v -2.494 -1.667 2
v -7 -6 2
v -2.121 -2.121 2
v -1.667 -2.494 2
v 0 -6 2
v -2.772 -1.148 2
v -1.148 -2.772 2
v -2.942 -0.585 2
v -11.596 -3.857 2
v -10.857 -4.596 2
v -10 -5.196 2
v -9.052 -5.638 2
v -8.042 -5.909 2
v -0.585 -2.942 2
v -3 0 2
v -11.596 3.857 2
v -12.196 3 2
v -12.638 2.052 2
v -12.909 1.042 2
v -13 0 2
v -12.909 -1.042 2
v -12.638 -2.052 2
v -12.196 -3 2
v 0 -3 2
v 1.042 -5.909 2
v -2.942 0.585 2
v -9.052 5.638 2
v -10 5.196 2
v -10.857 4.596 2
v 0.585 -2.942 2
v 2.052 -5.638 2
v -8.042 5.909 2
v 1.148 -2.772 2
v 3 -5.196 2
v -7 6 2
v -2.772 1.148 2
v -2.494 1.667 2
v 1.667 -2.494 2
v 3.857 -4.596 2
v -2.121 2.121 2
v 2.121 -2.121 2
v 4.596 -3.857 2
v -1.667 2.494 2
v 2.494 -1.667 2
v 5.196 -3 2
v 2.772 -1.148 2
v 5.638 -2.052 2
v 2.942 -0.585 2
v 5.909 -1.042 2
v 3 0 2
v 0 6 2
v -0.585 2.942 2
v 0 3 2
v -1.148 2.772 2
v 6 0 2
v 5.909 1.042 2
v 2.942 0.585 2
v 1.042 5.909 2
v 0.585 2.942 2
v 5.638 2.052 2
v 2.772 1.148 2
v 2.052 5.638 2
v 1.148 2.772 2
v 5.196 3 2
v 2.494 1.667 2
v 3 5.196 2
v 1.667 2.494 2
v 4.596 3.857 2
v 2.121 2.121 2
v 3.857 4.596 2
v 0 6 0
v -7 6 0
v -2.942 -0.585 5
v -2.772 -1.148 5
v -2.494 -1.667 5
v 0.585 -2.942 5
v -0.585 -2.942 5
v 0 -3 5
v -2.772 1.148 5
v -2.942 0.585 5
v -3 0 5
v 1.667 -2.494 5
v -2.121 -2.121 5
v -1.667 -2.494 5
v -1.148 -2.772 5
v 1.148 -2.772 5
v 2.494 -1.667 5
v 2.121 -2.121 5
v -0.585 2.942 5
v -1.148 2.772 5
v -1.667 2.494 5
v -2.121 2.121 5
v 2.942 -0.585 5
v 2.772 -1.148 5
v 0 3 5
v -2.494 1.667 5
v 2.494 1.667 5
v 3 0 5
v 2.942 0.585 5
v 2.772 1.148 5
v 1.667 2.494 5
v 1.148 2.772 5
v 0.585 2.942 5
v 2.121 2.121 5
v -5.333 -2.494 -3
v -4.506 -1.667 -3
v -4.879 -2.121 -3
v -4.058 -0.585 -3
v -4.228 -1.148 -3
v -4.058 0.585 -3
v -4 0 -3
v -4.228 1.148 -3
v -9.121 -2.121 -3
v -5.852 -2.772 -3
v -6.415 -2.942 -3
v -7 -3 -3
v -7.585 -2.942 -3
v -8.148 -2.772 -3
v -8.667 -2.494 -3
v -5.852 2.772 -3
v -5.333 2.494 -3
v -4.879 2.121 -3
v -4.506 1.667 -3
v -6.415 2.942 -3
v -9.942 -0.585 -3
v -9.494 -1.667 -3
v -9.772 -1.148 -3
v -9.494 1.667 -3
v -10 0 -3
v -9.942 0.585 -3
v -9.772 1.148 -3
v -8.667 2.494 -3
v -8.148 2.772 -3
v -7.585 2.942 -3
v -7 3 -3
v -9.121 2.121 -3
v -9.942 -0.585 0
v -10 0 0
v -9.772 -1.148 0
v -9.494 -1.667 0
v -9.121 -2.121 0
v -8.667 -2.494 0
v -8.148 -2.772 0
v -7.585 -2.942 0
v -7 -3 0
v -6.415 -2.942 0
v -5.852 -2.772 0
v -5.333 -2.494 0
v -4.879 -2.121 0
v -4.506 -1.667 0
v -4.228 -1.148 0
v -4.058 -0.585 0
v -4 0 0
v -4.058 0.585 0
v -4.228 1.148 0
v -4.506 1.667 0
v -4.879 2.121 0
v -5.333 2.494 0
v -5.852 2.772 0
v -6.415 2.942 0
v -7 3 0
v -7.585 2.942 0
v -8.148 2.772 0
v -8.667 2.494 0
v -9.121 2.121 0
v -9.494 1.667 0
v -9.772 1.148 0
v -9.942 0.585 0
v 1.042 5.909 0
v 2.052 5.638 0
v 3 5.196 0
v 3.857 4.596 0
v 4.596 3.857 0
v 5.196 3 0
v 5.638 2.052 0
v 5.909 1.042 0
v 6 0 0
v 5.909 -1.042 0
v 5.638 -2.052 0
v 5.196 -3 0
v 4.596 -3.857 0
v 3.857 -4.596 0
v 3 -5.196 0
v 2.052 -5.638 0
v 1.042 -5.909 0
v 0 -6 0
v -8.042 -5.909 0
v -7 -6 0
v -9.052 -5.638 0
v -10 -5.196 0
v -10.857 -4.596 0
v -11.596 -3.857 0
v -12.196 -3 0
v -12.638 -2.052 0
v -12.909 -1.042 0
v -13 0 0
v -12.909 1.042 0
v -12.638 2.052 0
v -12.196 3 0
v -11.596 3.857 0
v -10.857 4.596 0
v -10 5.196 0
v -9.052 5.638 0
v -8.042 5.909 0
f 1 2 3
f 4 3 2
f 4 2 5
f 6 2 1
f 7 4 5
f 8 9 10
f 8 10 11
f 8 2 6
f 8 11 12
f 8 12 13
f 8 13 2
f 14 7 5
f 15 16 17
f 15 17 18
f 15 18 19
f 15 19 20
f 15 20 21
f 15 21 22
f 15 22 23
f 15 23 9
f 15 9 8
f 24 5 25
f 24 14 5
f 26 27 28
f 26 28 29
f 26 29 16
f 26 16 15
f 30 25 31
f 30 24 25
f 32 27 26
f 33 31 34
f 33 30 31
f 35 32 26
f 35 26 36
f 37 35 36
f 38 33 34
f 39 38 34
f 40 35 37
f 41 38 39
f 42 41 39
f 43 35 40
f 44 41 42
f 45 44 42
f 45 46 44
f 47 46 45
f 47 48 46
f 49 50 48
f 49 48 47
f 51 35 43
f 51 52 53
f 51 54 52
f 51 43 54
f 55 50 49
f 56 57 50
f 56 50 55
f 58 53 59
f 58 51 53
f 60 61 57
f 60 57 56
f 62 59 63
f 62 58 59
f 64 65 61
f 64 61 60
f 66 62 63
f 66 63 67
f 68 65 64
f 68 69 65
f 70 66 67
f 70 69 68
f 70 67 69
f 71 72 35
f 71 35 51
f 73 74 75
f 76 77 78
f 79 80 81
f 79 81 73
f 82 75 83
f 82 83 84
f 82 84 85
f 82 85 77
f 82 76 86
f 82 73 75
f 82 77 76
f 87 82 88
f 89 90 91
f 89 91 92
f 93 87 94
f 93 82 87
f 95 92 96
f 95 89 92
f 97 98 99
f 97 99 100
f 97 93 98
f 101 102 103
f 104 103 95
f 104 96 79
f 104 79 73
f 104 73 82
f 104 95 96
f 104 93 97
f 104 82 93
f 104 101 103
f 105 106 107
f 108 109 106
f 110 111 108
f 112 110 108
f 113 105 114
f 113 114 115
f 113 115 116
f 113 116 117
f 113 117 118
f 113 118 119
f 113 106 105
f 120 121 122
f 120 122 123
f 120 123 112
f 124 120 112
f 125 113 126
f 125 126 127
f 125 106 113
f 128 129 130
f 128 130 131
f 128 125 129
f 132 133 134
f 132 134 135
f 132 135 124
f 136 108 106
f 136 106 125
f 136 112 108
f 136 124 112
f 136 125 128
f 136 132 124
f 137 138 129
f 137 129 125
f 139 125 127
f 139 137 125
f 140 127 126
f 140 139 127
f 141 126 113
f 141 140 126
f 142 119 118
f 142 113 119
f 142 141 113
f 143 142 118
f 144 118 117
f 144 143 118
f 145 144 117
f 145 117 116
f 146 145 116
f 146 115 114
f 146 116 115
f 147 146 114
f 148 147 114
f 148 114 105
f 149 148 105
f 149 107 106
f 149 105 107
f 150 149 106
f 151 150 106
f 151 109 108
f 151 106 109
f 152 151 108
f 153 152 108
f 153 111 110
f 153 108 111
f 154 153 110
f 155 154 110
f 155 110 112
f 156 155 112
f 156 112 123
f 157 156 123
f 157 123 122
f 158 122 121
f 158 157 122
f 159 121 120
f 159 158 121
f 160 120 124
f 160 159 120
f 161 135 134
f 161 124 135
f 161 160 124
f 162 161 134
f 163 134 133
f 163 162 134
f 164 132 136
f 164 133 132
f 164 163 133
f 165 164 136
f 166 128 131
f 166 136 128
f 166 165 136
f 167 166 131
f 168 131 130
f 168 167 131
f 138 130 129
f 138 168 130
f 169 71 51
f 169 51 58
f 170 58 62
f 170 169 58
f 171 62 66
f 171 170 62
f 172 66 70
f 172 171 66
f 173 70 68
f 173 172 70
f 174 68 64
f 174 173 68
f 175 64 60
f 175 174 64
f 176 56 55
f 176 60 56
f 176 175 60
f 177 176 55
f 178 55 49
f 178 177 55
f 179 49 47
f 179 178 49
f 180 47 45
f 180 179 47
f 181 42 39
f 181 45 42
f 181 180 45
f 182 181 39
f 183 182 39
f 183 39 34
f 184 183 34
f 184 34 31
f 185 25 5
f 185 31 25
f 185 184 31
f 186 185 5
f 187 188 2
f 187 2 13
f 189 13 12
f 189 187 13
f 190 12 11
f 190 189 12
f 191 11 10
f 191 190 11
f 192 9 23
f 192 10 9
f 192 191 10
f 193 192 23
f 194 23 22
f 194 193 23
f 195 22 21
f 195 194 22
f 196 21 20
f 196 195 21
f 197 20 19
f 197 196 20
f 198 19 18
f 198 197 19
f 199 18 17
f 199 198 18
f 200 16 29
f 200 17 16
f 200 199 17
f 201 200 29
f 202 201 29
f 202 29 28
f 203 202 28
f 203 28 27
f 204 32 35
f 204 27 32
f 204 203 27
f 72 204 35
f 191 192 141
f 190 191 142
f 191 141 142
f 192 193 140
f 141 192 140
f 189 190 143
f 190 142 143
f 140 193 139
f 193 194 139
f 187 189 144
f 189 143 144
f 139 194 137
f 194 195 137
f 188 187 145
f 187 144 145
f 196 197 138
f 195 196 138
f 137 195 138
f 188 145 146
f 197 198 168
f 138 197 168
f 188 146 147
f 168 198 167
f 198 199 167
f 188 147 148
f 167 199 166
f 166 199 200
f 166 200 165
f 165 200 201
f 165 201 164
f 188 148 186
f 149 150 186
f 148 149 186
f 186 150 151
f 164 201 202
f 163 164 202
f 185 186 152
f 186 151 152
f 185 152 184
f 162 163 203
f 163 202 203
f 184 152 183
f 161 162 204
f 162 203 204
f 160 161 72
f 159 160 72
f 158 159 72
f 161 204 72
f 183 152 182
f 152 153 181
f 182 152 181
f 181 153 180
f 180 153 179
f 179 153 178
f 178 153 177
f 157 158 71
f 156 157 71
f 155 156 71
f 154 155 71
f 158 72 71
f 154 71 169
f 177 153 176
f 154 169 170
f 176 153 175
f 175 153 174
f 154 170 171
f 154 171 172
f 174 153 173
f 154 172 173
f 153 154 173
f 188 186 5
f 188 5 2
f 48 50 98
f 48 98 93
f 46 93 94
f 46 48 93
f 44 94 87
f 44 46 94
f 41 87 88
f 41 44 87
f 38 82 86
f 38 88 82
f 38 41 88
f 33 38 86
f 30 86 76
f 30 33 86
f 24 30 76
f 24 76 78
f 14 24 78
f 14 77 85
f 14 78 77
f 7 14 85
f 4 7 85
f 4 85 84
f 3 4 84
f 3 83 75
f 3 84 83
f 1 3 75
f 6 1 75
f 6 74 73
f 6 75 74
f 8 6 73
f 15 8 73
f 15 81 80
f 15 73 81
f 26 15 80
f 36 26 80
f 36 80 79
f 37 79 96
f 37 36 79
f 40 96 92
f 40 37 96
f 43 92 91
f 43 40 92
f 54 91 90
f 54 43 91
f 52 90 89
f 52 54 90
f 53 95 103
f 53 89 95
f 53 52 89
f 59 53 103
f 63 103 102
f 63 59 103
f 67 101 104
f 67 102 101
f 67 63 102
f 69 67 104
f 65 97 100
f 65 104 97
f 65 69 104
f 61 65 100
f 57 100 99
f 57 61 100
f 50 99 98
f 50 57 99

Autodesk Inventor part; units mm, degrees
ref_plane "YZ Plane" through (0, 0, 0) normal (1, 0, 0) x (0, 1, 0)
ref_plane "XZ Plane" through (0, 0, 0) normal (0, 1, 0) x (-1, 0, 0)
ref_plane "XY Plane" through (0, 0, 0) normal (0, 0, 1) x (1, 0, 0)
sketch "スケッチ1" plane through (0, 0, 0) normal (0, 0, 1) x (1, 0, 0)
  circle A0 centre (0, 0) radius 17.5 construction
  circle A1 centre (-7, 0) radius 10.5 construction
  circle A2 centre (-7, 0) radius 6
  circle A3 centre (0, 0) radius 6
  line L0 (-7, 6) -> (0, 6)
  line L1 (0, 6) -> (0, -6) construction
  line L2 (0, -6) -> (-7, -6)
  line L3 (-7, -6) -> (-7, 6) construction
  dimension "d2" = 12
  dimension "d3" = 12
  dimension "d0" = 35
  dimension "d1" = 21
extrude "押し出し1" add sketch "スケッチ1" along normal blind 2
sketch "スケッチ2" plane through (0, 0, 2) normal (0, 0, 1) x (1, 0, 0)
  circle A0 centre (0, 0) radius 3
  dimension "d6" = 6
extrude "押し出し2" add sketch "スケッチ2" along normal blind 3
sketch "スケッチ3" plane through (0, 0, 0) normal (0, 0, -1) x (-1, 0, 0)
  arc A0 (7, -6) -> (7, 6) centre (7, 0) ccw projected
  circle A1 centre (7, 0) radius 3
  point P0 (0, 0)
  dimension "d9" = 6
extrude "押し出し3" add sketch "スケッチ3" along normal blind 3
properties part number "wrist_gear_spacer"
